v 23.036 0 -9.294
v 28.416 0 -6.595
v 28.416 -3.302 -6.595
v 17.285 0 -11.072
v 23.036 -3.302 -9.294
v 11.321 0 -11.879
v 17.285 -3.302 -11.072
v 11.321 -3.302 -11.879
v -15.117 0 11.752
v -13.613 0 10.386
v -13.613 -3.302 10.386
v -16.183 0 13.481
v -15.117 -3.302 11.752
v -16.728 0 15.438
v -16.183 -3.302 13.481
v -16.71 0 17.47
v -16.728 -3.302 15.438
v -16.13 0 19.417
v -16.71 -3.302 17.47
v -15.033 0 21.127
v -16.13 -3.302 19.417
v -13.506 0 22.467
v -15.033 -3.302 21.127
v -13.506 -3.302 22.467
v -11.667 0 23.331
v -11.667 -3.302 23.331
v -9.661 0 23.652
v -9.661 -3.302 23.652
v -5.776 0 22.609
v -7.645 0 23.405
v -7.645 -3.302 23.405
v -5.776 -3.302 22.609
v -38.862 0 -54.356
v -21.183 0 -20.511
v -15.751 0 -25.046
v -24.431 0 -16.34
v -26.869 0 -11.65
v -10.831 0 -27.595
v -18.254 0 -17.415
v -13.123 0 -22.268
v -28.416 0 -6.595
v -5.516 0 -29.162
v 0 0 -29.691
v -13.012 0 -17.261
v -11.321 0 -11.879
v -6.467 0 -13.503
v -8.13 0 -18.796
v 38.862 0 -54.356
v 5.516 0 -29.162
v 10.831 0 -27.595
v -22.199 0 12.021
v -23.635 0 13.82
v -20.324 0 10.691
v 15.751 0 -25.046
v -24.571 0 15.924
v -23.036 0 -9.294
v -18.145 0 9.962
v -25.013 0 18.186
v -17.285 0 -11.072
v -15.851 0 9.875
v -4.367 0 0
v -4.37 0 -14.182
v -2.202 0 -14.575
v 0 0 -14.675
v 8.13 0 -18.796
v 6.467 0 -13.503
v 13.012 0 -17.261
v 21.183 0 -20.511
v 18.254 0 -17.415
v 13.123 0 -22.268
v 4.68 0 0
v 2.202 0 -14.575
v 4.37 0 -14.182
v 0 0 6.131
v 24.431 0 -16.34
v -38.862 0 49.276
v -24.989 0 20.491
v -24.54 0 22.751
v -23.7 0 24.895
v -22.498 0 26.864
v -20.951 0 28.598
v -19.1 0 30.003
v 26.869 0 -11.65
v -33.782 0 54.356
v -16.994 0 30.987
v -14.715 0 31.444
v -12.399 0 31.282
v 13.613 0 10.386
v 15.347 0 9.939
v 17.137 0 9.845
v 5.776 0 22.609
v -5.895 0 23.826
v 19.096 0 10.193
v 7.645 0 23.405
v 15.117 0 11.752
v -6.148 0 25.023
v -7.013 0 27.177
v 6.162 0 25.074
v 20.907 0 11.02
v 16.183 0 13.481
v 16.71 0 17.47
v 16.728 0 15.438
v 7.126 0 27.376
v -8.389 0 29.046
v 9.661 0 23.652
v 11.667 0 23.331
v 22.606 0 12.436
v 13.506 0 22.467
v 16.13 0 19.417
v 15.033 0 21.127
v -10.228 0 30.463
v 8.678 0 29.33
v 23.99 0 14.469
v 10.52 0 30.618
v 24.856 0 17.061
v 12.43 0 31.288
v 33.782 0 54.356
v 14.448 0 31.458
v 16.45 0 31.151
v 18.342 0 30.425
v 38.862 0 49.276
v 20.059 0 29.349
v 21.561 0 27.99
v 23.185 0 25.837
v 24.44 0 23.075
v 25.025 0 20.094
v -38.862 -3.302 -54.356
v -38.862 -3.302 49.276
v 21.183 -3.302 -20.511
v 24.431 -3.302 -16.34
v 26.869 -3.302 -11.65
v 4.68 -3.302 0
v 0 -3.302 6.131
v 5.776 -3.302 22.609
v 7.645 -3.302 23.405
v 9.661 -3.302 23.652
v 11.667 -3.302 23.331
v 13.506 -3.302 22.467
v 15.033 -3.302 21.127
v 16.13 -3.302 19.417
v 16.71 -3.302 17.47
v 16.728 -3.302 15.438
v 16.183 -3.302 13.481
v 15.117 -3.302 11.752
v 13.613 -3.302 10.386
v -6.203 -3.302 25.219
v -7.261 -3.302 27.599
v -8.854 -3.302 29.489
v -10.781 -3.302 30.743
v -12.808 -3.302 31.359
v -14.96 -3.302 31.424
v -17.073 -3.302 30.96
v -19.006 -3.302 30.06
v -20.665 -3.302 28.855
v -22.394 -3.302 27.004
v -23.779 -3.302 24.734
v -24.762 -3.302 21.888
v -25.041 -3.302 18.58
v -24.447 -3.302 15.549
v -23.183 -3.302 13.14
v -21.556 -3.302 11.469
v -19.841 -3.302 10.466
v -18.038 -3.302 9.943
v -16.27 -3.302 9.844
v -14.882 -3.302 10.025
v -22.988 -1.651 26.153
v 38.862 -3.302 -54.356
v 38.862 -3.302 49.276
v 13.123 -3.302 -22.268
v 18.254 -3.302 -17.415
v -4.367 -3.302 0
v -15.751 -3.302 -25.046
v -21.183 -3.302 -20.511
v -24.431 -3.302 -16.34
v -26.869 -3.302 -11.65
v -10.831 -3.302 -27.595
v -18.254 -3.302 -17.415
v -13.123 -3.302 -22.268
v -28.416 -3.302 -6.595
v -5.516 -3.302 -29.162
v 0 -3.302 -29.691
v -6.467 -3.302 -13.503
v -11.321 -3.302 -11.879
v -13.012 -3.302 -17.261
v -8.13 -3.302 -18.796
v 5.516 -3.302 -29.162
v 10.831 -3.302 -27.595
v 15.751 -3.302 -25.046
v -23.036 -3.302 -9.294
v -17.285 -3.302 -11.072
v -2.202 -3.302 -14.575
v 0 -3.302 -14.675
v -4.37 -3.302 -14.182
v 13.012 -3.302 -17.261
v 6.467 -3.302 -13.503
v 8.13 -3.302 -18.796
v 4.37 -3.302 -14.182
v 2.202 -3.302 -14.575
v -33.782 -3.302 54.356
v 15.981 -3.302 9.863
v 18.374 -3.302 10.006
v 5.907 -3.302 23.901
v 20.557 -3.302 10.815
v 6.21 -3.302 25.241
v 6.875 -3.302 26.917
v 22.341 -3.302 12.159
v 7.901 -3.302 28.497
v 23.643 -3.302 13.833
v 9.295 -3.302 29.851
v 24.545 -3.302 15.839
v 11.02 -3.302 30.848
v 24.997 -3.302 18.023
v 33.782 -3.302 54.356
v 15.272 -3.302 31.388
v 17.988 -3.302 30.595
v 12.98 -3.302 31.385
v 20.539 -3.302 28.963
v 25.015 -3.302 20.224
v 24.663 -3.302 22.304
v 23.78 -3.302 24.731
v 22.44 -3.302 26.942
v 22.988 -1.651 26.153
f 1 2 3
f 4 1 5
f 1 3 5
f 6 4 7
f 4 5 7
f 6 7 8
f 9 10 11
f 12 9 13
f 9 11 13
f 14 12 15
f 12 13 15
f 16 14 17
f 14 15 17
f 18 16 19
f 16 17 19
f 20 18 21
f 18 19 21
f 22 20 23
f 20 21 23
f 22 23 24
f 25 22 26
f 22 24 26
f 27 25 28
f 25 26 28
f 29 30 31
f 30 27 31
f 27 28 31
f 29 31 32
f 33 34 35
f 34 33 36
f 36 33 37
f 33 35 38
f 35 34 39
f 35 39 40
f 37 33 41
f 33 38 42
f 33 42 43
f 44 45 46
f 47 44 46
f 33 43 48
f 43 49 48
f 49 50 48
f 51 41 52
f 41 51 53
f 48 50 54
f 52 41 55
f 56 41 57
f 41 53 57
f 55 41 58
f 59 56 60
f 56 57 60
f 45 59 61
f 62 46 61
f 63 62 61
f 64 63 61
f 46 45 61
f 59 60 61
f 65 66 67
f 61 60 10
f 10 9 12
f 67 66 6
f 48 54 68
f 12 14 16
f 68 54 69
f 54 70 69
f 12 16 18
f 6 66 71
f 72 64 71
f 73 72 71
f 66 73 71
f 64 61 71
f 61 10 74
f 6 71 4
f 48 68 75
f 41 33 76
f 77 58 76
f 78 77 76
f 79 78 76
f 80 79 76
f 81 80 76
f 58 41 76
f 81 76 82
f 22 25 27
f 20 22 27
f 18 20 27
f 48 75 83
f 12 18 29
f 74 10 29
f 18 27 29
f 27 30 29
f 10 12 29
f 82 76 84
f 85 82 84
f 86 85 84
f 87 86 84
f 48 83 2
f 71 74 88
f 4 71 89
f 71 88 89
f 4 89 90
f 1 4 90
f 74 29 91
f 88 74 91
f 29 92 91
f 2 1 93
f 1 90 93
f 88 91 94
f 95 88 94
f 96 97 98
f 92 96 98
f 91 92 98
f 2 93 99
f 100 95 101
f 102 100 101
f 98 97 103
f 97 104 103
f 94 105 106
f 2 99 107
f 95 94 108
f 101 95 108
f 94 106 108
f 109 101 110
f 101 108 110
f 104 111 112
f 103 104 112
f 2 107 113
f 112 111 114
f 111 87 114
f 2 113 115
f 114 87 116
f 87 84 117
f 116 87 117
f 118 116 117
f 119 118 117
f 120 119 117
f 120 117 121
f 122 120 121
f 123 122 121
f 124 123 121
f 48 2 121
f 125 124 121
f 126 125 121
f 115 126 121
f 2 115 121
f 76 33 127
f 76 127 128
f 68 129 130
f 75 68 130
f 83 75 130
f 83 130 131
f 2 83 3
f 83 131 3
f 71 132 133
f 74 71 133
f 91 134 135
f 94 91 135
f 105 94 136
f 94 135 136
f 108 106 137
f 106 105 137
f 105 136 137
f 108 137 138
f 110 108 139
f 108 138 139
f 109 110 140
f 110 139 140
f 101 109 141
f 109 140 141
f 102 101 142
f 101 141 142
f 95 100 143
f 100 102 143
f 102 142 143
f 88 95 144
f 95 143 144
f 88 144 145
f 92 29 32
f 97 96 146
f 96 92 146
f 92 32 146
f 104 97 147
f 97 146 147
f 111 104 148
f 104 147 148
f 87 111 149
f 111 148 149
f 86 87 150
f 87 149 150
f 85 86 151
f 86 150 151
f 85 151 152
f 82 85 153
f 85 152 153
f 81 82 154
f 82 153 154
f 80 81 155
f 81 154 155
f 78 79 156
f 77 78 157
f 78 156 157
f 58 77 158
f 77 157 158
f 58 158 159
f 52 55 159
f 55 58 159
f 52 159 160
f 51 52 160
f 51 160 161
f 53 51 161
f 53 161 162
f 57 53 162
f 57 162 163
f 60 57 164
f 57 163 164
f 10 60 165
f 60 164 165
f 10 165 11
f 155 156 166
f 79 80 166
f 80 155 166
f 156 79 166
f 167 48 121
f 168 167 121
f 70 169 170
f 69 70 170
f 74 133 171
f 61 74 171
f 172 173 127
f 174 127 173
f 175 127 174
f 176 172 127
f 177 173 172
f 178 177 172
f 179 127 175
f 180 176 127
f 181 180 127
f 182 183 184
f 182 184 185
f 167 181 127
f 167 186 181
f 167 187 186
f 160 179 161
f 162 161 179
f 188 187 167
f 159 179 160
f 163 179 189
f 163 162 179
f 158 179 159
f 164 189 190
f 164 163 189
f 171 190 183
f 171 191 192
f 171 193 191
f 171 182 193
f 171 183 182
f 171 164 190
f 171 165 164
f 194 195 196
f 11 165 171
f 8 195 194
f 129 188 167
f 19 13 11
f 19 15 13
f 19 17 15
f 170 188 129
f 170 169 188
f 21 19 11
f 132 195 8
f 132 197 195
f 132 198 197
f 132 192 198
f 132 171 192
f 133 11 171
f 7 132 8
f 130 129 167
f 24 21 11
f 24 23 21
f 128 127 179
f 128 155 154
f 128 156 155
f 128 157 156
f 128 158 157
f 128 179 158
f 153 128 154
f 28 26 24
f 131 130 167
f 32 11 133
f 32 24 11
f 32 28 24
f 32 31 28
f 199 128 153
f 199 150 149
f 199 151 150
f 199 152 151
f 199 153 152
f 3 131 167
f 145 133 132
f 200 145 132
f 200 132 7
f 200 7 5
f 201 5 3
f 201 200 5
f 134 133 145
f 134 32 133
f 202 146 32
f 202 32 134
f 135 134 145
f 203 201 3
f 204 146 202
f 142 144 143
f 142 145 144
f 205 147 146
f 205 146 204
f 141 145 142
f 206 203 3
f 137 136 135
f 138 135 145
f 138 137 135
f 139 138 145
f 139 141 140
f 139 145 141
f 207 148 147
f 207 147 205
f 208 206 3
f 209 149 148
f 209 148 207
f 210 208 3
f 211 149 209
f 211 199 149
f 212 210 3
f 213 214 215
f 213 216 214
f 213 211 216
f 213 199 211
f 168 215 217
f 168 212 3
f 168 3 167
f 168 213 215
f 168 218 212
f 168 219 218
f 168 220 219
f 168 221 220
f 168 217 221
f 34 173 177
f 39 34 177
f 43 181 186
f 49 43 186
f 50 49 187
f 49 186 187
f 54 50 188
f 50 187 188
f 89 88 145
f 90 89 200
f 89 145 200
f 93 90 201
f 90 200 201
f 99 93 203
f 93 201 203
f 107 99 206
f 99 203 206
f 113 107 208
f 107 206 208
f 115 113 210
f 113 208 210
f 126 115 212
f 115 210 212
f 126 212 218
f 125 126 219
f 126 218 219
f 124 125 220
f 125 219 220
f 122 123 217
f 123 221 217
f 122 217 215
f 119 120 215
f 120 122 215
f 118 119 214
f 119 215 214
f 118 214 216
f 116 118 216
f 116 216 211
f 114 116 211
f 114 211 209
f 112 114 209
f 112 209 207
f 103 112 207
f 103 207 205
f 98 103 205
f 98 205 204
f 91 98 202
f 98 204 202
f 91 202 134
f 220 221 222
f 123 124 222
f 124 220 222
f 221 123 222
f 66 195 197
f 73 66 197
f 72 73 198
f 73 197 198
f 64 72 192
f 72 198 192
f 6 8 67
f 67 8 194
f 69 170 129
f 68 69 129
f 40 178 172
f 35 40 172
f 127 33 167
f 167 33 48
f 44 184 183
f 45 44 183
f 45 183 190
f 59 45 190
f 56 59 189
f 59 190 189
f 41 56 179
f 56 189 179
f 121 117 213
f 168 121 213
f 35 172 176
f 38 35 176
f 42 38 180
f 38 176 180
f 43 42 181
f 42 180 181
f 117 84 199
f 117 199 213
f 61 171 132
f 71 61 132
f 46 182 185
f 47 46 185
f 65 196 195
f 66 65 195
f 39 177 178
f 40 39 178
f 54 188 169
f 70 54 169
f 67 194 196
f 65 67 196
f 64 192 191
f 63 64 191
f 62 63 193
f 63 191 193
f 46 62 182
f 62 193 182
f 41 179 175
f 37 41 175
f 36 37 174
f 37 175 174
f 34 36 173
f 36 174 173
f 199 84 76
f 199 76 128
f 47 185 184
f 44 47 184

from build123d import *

# Parameters (mm, degrees)
F0_W     = 77.724
F0_H     = 108.712
F1_DEPTH = 3.302
F3_R     = 13.3445871966
F4_DEPTH = 3.302
F5_SIZE  = 5.08
F7_DEPTH = 3.303


with BuildPart() as f1:
    # F0 (on Front) → F1 (new body)
    with BuildSketch(Plane.XZ):
        Rectangle(F0_W, F0_H)
    extrude(amount=F1_DEPTH)

    # F3 (on face) → F4 (join)
    with BuildSketch(Plane.XZ.offset(3.302)):
        with BuildLine():
            add(Edge.make_bspline(
                [(-33.1284857231, -24.3833554431), (-30.3980902484, -23.448268281), (-27.6625298974, -23.0135580616), (-24.9168122419, -22.8877504962)],
                knots=[0.0236239796, 0.0236239796, 0.0236239796, 0.0236239796, 0.1438563975, 0.1438563975, 0.1438563975, 0.1438563975], degree=3))
            ThreePointArc((-33.1284857231, -24.3833554431), (-29.1410849834, -38.4326879001), (-15.8749999992, -44.5395771521))
            ThreePointArc((-15.8749999992, -44.5395771521), (-7.7803065213, -45.3411097626), (9e-10, -47.7145771515))
            ThreePointArc((9e-10, -47.7145771515), (7.780306523, -45.3411097624), (15.8750000008, -44.5395771515))
            ThreePointArc((15.8750000008, -44.5395771515), (28.9710149024, -38.6284104056), (33.2008619827, -24.8968448621))
            add(Edge.make_bspline(
                [(22.7832318895, -28.264905571), (26.870414184, -28.3483991479), (30.7081117423, -27.7740633769), (33.2008619827, -24.8968448621)],
                knots=[0.8224951004, 0.8224951004, 0.8224951004, 0.8224951004, 0.9908039431, 0.9908039431, 0.9908039431, 0.9908039431], degree=3))
            add(Edge.make_bspline(
                [(15.9953683619, -27.7933645546), (16.7598950609, -27.862629463), (19.0104314318, -28.0581684328), (21.3052242348, -28.2347126075), (22.7832318895, -28.264905571)],
                knots=[0.7300371536, 0.7300371536, 0.7300371536, 0.7300371536, 0.7616312241, 0.8224951004, 0.8224951004, 0.8224951004, 0.8224951004], degree=3))
            add(Edge.make_bspline(
                [(12.0445173218, -27.4086319137), (13.3501324037, -27.5450763369), (14.6659309282, -27.6729196282), (15.9953683619, -27.7933645546)],
                knots=[0.6750981435, 0.6750981435, 0.6750981435, 0.6750981435, 0.7300371536, 0.7300371536, 0.7300371536, 0.7300371536], degree=3))
            add(Edge.make_bspline(
                [(6.5035843618, -26.7679947406), (8.3365045469, -27.0014140297), (10.1801283043, -27.2137923413), (12.0445173218, -27.4086319137)],
                knots=[0.5966464709, 0.5966464709, 0.5966464709, 0.5966464709, 0.6750981435, 0.6750981435, 0.6750981435, 0.6750981435], degree=3))
            add(Edge.make_bspline(
                [(-15.7821923495, -23.3437299796), (-10.5480047667, -23.9624284424), (-3.1004870846, -25.4363431139), (4.3262408996, -26.490713729), (6.5035843618, -26.7679947406)],
                knots=[0.2765511336, 0.2765511336, 0.2765511336, 0.2765511336, 0.5034529768, 0.5966464709, 0.5966464709, 0.5966464709, 0.5966464709], degree=3))
            add(Edge.make_bspline(
                [(-24.9168122419, -22.8877504962), (-22.5127229742, -22.777596192), (-19.4725911361, -22.9372512735), (-16.4147628171, -23.2689580365), (-15.7821923495, -23.3437299796)],
                knots=[0.1438563975, 0.1438563975, 0.1438563975, 0.1438563975, 0.2491292266, 0.2765511336, 0.2765511336, 0.2765511336, 0.2765511336], degree=3))
        make_face()
        with BuildLine():
            ThreePointArc((-24.3962783332, -9.4429305632), (-23.5493439512, -16.2082072875), (-24.9168122419, -22.8877504962))
            add(Edge.make_bspline(
                [(-24.9168122419, -22.8877504962), (-22.5127229742, -22.777596192), (-19.4725911361, -22.9372512735), (-16.4147628171, -23.2689580365), (-15.7821923495, -23.3437299796)],
                knots=[0.1438563975, 0.1438563975, 0.1438563975, 0.1438563975, 0.2491292266, 0.2765511336, 0.2765511336, 0.2765511336, 0.2765511336], degree=3))
            ThreePointArc((-15.7821923495, -23.3437299796), (-16.7909764629, -16.1431204561), (-15.7821923495, -8.9425109327))
            add(Edge.make_bspline(
                [(-20.8150930703, 3.0249084812), (-20.084698855, 3.2617064252), (-18.5750809579, 3.7511331524), (-20.1108934357, 5.7423249077), (-21.3989497629, 8.4805039988), (-19.5926222129, 8.6232034417), (-20.0960081308, 6.4882204736), (-17.9845367, 4.4717269755), (-19.4827279307, 7.4877563676), (-17.6531933794, 7.9935220173), (-17.6518746238, 3.7165445405), (-19.7201607312, 2.5442912986), (-19.0033211234, 0.5113026434), (-21.5358089244, 0.646088536), (-20.7796208818, -5.7027505195), (-14.9489180074, 0.0978196974), (-17.977030073, 1.5236381763), (-14.9168721562, 2.6666255778), (-16.1211586732, 6.3598723413), (-13.8328776174, 5.6005762962), (-15.1421128769, 3.3154322822), (-14.4747759607, 0.1624480587), (-13.8084140261, 5.1188240441), (-11.0343102947, 2.7331078221), (-14.5615723999, -0.162479085), (-17.3031216925, -3.3366762112), (-18.0975664008, -8.8898410691), (-13.4356882131, -5.5746333853), (-15.3648709473, -3.8082111356), (-12.0527139611, -3.6659211986), (-13.248535603, -1.079337143), (-9.5910344453, -1.7447413323), (-10.7422685487, 3.0079941618), (-8.9849464366, -1.96339633), (-8.8102943074, 5.4988116301), (-7.4861779197, -0.6957485248), (-9.6724060403, -0.966318494), (-11.0218385517, -3.5291741027), (-13.7004320012, -4.2797101397), (-12.8029593717, -6.9381020727), (-14.7089673153, -8.2196946287), (-15.7821923495, -8.9425109327)],
                knots=[0, 0, 0, 0, 0.0231511603, 0.0478500744, 0.0752755755, 0.0903366321, 0.1142638791, 0.1352244444, 0.1593040946, 0.1744947233, 0.2060790631, 0.2315955315, 0.2516703156, 0.2733460952, 0.3049833457, 0.3431527772, 0.3650886659, 0.3896180862, 0.4183185893, 0.4354180503, 0.4626318971, 0.4841465121, 0.512674348, 0.5346264378, 0.5675595767, 0.6056671213, 0.6368592747, 0.6681518224, 0.6879987795, 0.7121233264, 0.7334743783, 0.7591560932, 0.7848708559, 0.8073025156, 0.8374341523, 0.8673194844, 0.8904493251, 0.9187369989, 0.9444600919, 0.9686867066, 1, 1, 1, 1], degree=3))
            add(Edge.make_bspline(
                [(-25.8914344013, -2.4853385985), (-26.396572956, -2.0003344615), (-27.3138435109, -1.1196261405), (-29.1352849859, -2.0598979002), (-28.7106271057, 0.8204026064), (-32.0312644098, -1.1715068103), (-31.3002695814, 3.7485837155), (-29.4483178555, 3.8301118075), (-30.8071023081, 1.5653871303), (-28.9526334159, 1.3619840648), (-29.4792210737, 5.2085047756), (-26.921055424, 4.4342075194), (-28.8119762327, 2.2854028303), (-27.5906596289, -1.3990701213), (-27.7699356497, 3.0747016102), (-25.2099586785, 2.6066763518), (-26.5953437573, -0.395391095), (-23.7025988652, -2.0340069969), (-23.1772681034, -6.0499515041), (-20.5435134821, -4.1808959475), (-25.0748704565, 2.6489737746), (-20.1368344266, 0.7949418705), (-20.6048167244, 2.3336418411), (-20.8150930703, 3.0249084812)],
                knots=[0, 0, 0, 0, 0.0457250435, 0.0830311605, 0.1245988121, 0.1705511092, 0.2321726775, 0.2625557415, 0.30723362, 0.3358214151, 0.393012377, 0.4286583434, 0.4808472993, 0.5282384525, 0.5813000538, 0.6192860311, 0.6705302416, 0.7286736986, 0.7872738172, 0.8280557864, 0.9074882994, 0.958434574, 1, 1, 1, 1], degree=3))
            ThreePointArc((-25.8914344013, -2.4853385985), (-24.9290967698, -4.9824855111), (-24.3962783332, -7.6050683856))
            add(Edge.make_bspline(
                [(-24.3962783332, -9.4429305632), (-25.4357243907, -10.1342055857), (-27.412273175, -11.4486922391), (-27.4547789496, -7.4214675852), (-30.5466070306, -9.5733915774), (-30.4542370334, -5.4520792207), (-32.3177618611, -5.8417990903), (-32.7140680164, -4.2769830225), (-32.0543630337, -2.7007935171), (-32.1251676799, -4.5533058245), (-30.3843482976, -5.4648837492), (-32.0501040037, -1.6640768267), (-30.4436660674, -1.9005229869), (-30.1720801803, -6.5942041642), (-29.7456686663, -3.178537531), (-28.1334595609, -3.5814958653), (-29.8697325683, -5.6494579394), (-29.5018476184, -7.7306733995), (-27.2359049314, -6.3250302911), (-26.4788550338, -9.3239236743), (-25.0993332141, -8.1853413666), (-24.3962783332, -7.6050683856)],
                knots=[0, 0, 0, 0, 0.0670169121, 0.1274354192, 0.1840138636, 0.2505621343, 0.2960523516, 0.3441354147, 0.3840734056, 0.4287810373, 0.4665753725, 0.5348972739, 0.5667760176, 0.6369485958, 0.6883070256, 0.7231632661, 0.7842390879, 0.8324575559, 0.8851485442, 0.9414679355, 1, 1, 1, 1], degree=3))
        make_face()
        with BuildLine():
            add(Edge.make_bspline(
                [(-20.2924981713, -15.781018883), (-20.5370775999, -16.1379246214), (-20.134132622, -17.1534868603), (-20.8639151565, -18.5661521393), (-21.9358468203, -19.4575377926), (-22.3700864307, -21.8865095148), (-20.237349518, -21.5763362209), (-19.5672362136, -20.438180371), (-19.2965010699, -18.8033454883), (-19.7803037906, -17.8720601229), (-19.908738804, -16.4540465799), (-19.0188083322, -15.0649598827), (-20.0853771822, -15.4787748635), (-20.2924981713, -15.781018883)],
                knots=[0, 0, 0, 0, 0.0904118203, 0.1854248684, 0.2814922978, 0.3865094541, 0.4809925493, 0.5711470892, 0.6690619631, 0.748512495, 0.8439845899, 0.9234351565, 1, 1, 1, 1], degree=3))
        make_face(mode=Mode.SUBTRACT)
        with BuildLine():
            add(Edge.make_bspline(
                [(-22.3910957575, -11.5529615432), (-22.0568118654, -12.2037220004), (-21.1170784891, -12.8832887919), (-21.7129777335, -14.1967346716), (-20.5379115522, -14.568750962), (-20.4867607869, -13.5076873001), (-20.8432701563, -11.8831681267), (-21.6439811905, -11.2404808042), (-22.9718655512, -9.3501247732), (-22.6978835435, -10.9557285785), (-22.3910957575, -11.5529615432)],
                knots=[0, 0, 0, 0, 0.1505340204, 0.2658311351, 0.3614801071, 0.4617187858, 0.6051372816, 0.7298931385, 0.8618479683, 1, 1, 1, 1], degree=3))
        make_face(mode=Mode.SUBTRACT)
        with BuildLine():
            add(Edge.make_bspline(
                [(-18.3790698647, -10.1024601609), (-18.7969421772, -10.2564427963), (-19.1553590595, -11.577398565), (-19.219348267, -12.6506630096), (-19.2408550579, -13.9350019391), (-18.8743899715, -14.8858473731), (-18.2833235222, -14.0155234153), (-18.1315989973, -13.0706647968), (-18.7065283271, -12.3462231403), (-18.4694817034, -11.2210464666), (-17.1590443019, -10.374237249), (-18.0760721444, -9.9908079022), (-18.3790698647, -10.1024601609)],
                knots=[0, 0, 0, 0, 0.1240572212, 0.2333232805, 0.347818092, 0.428679644, 0.5131510602, 0.6107152668, 0.7012679009, 0.8047604962, 0.9100465523, 1, 1, 1, 1], degree=3))
        make_face(mode=Mode.SUBTRACT)
        with BuildLine():
            ThreePointArc((5.4403450859, -12.5461180708), (6.6092683485, -19.609411059), (6.5035843618, -26.7679947406))
            add(Edge.make_bspline(
                [(6.5035843618, -26.7679947406), (8.3365045469, -27.0014140297), (10.1801283043, -27.2137923413), (12.0445173218, -27.4086319137)],
                knots=[0.5966464709, 0.5966464709, 0.5966464709, 0.5966464709, 0.6750981435, 0.6750981435, 0.6750981435, 0.6750981435], degree=3))
            Line((12.0445173218, -27.4086319137), (12.0445173218, -21.4756764472))
            ThreePointArc((12.0445173218, -21.4756764472), (14.0199428419, -19.5002509271), (15.9953683619, -21.4756764472))
            Line((15.9953683619, -21.4756764472), (15.9953683619, -27.7933645546))
            add(Edge.make_bspline(
                [(15.9953683619, -27.7933645546), (16.7598950609, -27.862629463), (19.0104314318, -28.0581684328), (21.3052242348, -28.2347126075), (22.7832318895, -28.264905571)],
                knots=[0.7300371536, 0.7300371536, 0.7300371536, 0.7300371536, 0.7616312241, 0.8224951004, 0.8224951004, 0.8224951004, 0.8224951004], degree=3))
            ThreePointArc((22.7832318895, -28.264905571), (22.4736636829, -20.3696155623), (23.5801553445, -12.5461180708))
            Line((23.5801553445, -12.5461180708), (28.4554600831, -13.4531514135))
            ThreePointArc((28.4554600831, -13.4531514135), (31.673336573, -11.9989868814), (31.424967593, -8.4765393743))
            ThreePointArc((31.424967593, -8.4765393743), (29.2529740879, -8.2440657168), (29.0205004305, -10.4160592219))
            ThreePointArc((29.0205004305, -10.4160592219), (29.058069024, -11.9208265797), (27.614886003, -12.3485636115))
            ThreePointArc((27.614886003, -12.3485636115), (23.4712314741, -5.8636115848), (28.4554600831, 0))
            ThreePointArc((28.4554600831, 0), (23.3706331923, -0.6006945639), (18.2612345592, -0.9328753515))
            Line((18.2612345592, -0.9328753515), (21.109645709, 8.6648291047))
            Line((21.109645709, 8.6648291047), (22.7452469365, 8.179414619))
            ThreePointArc((22.7452469365, 8.179414619), (24.0675287583, 9.9087492795), (21.9295363303, 9.4988517773))
            ThreePointArc((21.9295363303, 9.4988517773), (17.0915933325, 15.0640837031), (15.5871994793, 22.2831070423))
            Line((15.5871994793, 22.2831070423), (14.8853833456, 29.6840668302))
            Line((14.8853833456, 29.6840668302), (17.9889984262, 30.165095753))
            Line((17.9889984262, 30.165095753), (17.720128815, 31.8998516907))
            Line((17.720128815, 31.8998516907), (14.8043116011, 31.4479295364))
            Line((14.8043116011, 31.4479295364), (14.2361351446, 35.1138234881))
            Line((14.2361351446, 35.1138234881), (12.1174789965, 34.7854532301))
            Line((12.1174789965, 34.7854532301), (12.6562453806, 31.3093140721))
            Line((12.6562453806, 31.3093140721), (10.0379107516, 30.7162171018))
            Line((10.0379107516, 30.7162171018), (10.2517836951, 29.4975203391))
            Line((10.2517836951, 29.4975203391), (12.7509497106, 29.9361068755))
            Line((12.7509497106, 29.9361068755), (14.0939988196, 22.2831070423))
            ThreePointArc((14.0939988196, 22.2831070423), (12.6245914015, 15.2177663733), (7.6988285058, 9.9437681912))
            ThreePointArc((7.6988285058, 9.9437681912), (5.5906171254, 10.4864212664), (6.8022884056, 8.6778637491))
            Line((6.8022884056, 8.6778637491), (8.4650181234, 9.060157463))
            Line((8.4650181234, 9.060157463), (10.762639533, -0.9330055424))
            ThreePointArc((10.762639533, -0.9330055424), (5.6515483018, -0.6008483836), (0.5650403473, 0))
            ThreePointArc((0.5650403473, 0), (5.5492689564, -5.8636115848), (1.4056144274, -12.3485636115))
            ThreePointArc((1.4056144274, -12.3485636115), (-0.0375685935, -11.9208265797), (0, -10.4160592219))
            ThreePointArc((0, -10.4160592219), (-0.2324736575, -8.2440657168), (-2.4044671625, -8.4765393743))
            ThreePointArc((-2.4044671625, -8.4765393743), (-2.6528361426, -11.9989868814), (0.5650403473, -13.4531514135))
            Line((0.5650403473, -13.4531514135), (5.4403450859, -12.5461180708))
        make_face()
        Polygon((9.1227404773, -7.4148867279), (8.4774624556, -4.9826856703), (9.749203307, -4.868891682), (10.3401336819, -7.1323132142), align=None, mode=Mode.SUBTRACT)
        Polygon((10.9397291529, -9.5362256838), (9.768018499, -9.8470877856), (9.2899553012, -8.0451578014), (10.461665955, -7.7342956997), align=None, mode=Mode.SUBTRACT)
        Polygon((12.2584053658, -7.3401992658), (12.7159978886, -9.0649705743), (11.5734964264, -9.3680832964), (11.1159039036, -7.6433119879), align=None, mode=Mode.SUBTRACT)
        Polygon((10.332212454, -4.8167246576), (11.5597705233, -4.7068840966), (12.1378842059, -6.8859273354), (10.9000811353, -7.0559568703), align=None, mode=Mode.SUBTRACT)
        Polygon((17.9045965268, -7.6433119879), (17.4470040041, -9.3680832964), (16.3045025419, -9.0649705743), (16.7620950646, -7.3401992658), align=None, mode=Mode.SUBTRACT)
        Polygon((18.5588344754, -7.7342956997), (19.7305451293, -8.0451578014), (19.2524819314, -9.8470877856), (18.0807712776, -9.5362256838), align=None, mode=Mode.SUBTRACT)
        Polygon((18.6803667486, -7.1323132142), (19.2712971234, -4.868891682), (20.5430379748, -4.9826856703), (19.8977599531, -7.4148867279), align=None, mode=Mode.SUBTRACT)
        Polygon((16.8826162245, -6.8859273354), (17.4607299071, -4.7068840966), (18.6882879764, -4.8167246576), (18.1204192951, -7.0559568703), align=None, mode=Mode.SUBTRACT)
        with BuildLine():
            ThreePointArc((14.2767767446, 4.6611620079), (12.1414040207, 5.7303494735), (11.1097303552, 7.8840968947))
            Line((11.1097303552, 7.8840968947), (14.2767767446, 7.8840968947))
            Line((14.2767767446, 7.8840968947), (14.2767767446, 4.6611620079))
        make_face(mode=Mode.SUBTRACT)
        with BuildLine():
            ThreePointArc((11.1459939594, 8.983289175), (12.2280091457, 10.9819830574), (14.2767767446, 11.9658963789))
            Line((14.2767767446, 11.9658963789), (14.2767767446, 8.983289175))
            Line((14.2767767446, 8.983289175), (11.1459939594, 8.983289175))
        make_face(mode=Mode.SUBTRACT)
        with BuildLine():
            ThreePointArc((18.430607267, 7.8840968947), (17.3673699452, 5.6986165643), (15.1747141111, 4.6502567644))
            Line((15.1747141111, 4.6502567644), (15.1747141111, 7.8840968947))
            Line((15.1747141111, 7.8840968947), (18.430607267, 7.8840968947))
        make_face(mode=Mode.SUBTRACT)
        with BuildLine():
            ThreePointArc((15.1747141111, 11.9768016224), (17.2797356479, 11.0126579566), (18.3943436628, 8.983289175))
            Line((18.3943436628, 8.983289175), (15.1747141111, 8.983289175))
            Line((15.1747141111, 8.983289175), (15.1747141111, 11.9768016224))
        make_face(mode=Mode.SUBTRACT)
        with BuildLine():
            ThreePointArc((1.5084841621, 28.7364097307), (5.1963193944, 39.8156504287), (15.8749999992, 44.5395771521))
            ThreePointArc((15.8749999992, 44.5395771521), (7.7803065213, 45.3411097626), (-9e-10, 47.7145771515))
            ThreePointArc((-9e-10, 47.7145771515), (-7.780306523, 45.3411097624), (-15.8750000008, 44.5395771515))
            ThreePointArc((-15.8750000008, 44.5395771515), (-30.2008361805, 37.0625327748), (-32.2586794783, 21.0343995142))
            ThreePointArc((-32.2586794783, 21.0343995142), (-31.4618060576, 11.8664205536), (-35.4362714152, 3.5663922047))
            ThreePointArc((-35.4362714152, 3.5663922047), (-26.8661908779, 8.4248419398), (-17.0921185192, 9.6570447531))
            ThreePointArc((-17.0921185192, 9.6570447531), (-3.3712650978, 14.8871009528), (1.5084841621, 28.7364097307))
        make_face()
        with Locations((-15.8750000008, 27.0770771515)):
            Circle(F3_R, mode=Mode.SUBTRACT)
    extrude(amount=-F4_DEPTH)

    # F5
    f5_edges = [f1.edges().sort_by_distance(p)[0] for p in [
        (-38.862, -1.651, 54.356),
        (38.862, -1.651, 54.356),
    ]]
    chamfer(f5_edges, length=F5_SIZE)

    # F6 (on face) → F7 (cut, through all)
    with BuildSketch(Plane.XZ.offset(3.302)):
        with BuildLine():
            ThreePointArc((5.7757666146, 22.609140253), (15.6416294725, 20.3104914352), (13.6132997632, 10.3855272082))
            add(Edge.make_bspline(
                [(13.6132997632, 10.3855272082), (38.942541189, 1.270026192), (22.9883596932, 26.1525673378), (7.0341781974, 51.0351084836), (5.7757666146, 22.609140253)],
                knots=[5.5954690947, 5.5954690947, 5.5954690947, 8.0209649387, 8.0209649387, 10.4464607828, 10.4464607828, 10.4464607828], degree=2, weights=[1, 0.3504470718, 1, 0.3504470718, 1]))
        make_face()
        Polygon((4.6801641583, 0), (0, 6.1310827732), (-4.3672695756, 0), align=None)
        with BuildLine():
            ThreePointArc((-15.7507828857, -25.0461277001), (-8.2106719148, -28.5054611384), (1.1e-09, -29.690842082))
            ThreePointArc((0, -29.690842082), (8.2106719158, -28.5054611381), (15.7507828867, -25.0461276995))
            Line((15.7507828867, -25.0461276995), (13.1229529608, -22.2676816723))
            Line((13.1229529608, -22.2676816723), (18.2542123508, -17.4145814679))
            Line((18.2542123508, -17.4145814679), (21.182530755, -20.5107387025))
            ThreePointArc((21.182530755, -20.5107387025), (25.7569660306, -14.0504124271), (28.4160997436, -6.594523374))
            ThreePointArc((28.4160997436, -6.594523374), (20.197522428, -10.3014258409), (11.3208206988, -11.8794959923))
            Line((11.3208206988, -11.8794959923), (13.0121000111, -17.2614511102))
            Line((13.0121000111, -17.2614511102), (8.1299955286, -18.7956523681))
            Line((8.1299955286, -18.7956523681), (6.4667478635, -13.5028989958))
            ThreePointArc((6.4667478635, -13.5028989958), (3.2923883342, -14.4145728535), (0, -14.6751236171))
            ThreePointArc((5e-10, -14.6751236171), (-3.2923883337, -14.4145728536), (-6.466747863, -13.5028989961))
            Line((-6.466747863, -13.5028989961), (-8.1299955279, -18.7956523684))
            Line((-8.1299955279, -18.7956523684), (-13.0121000105, -17.2614511107))
            Line((-13.0121000105, -17.2614511107), (-11.3208206984, -11.8794959927))
            ThreePointArc((-11.3208206984, -11.8794959927), (-20.1975224276, -10.3014258416), (-28.4160997433, -6.594523375))
            ThreePointArc((-28.4160997433, -6.594523375), (-25.7569660301, -14.050412428), (-21.1825307542, -20.5107387033))
            Line((-21.1825307542, -20.5107387033), (-18.2542123502, -17.4145814686))
            Line((-18.2542123502, -17.4145814686), (-13.12295296, -22.2676816727))
            Line((-13.12295296, -22.2676816727), (-15.7507828857, -25.0461277001))
        make_face()
        with BuildLine():
            ThreePointArc((-13.6132997636, 10.3855272077), (-15.6416294733, 20.3104914347), (-5.7757666155, 22.6091402528))
            add(Edge.make_bspline(
                [(-5.7757666155, 22.6091402528), (-7.0341781993, 51.0351084833), (-22.9883596942, 26.1525673369), (-38.942541189, 1.2700261905), (-13.6132997636, 10.3855272077)],
                knots=[2.1199098315, 2.1199098315, 2.1199098315, 4.5454056756, 4.5454056756, 6.9709015197, 6.9709015197, 6.9709015197], degree=2, weights=[1, 0.3504470718, 1, 0.3504470718, 1]))
        make_face()
    extrude(amount=-F7_DEPTH, mode=Mode.SUBTRACT)


solid = f1.part
